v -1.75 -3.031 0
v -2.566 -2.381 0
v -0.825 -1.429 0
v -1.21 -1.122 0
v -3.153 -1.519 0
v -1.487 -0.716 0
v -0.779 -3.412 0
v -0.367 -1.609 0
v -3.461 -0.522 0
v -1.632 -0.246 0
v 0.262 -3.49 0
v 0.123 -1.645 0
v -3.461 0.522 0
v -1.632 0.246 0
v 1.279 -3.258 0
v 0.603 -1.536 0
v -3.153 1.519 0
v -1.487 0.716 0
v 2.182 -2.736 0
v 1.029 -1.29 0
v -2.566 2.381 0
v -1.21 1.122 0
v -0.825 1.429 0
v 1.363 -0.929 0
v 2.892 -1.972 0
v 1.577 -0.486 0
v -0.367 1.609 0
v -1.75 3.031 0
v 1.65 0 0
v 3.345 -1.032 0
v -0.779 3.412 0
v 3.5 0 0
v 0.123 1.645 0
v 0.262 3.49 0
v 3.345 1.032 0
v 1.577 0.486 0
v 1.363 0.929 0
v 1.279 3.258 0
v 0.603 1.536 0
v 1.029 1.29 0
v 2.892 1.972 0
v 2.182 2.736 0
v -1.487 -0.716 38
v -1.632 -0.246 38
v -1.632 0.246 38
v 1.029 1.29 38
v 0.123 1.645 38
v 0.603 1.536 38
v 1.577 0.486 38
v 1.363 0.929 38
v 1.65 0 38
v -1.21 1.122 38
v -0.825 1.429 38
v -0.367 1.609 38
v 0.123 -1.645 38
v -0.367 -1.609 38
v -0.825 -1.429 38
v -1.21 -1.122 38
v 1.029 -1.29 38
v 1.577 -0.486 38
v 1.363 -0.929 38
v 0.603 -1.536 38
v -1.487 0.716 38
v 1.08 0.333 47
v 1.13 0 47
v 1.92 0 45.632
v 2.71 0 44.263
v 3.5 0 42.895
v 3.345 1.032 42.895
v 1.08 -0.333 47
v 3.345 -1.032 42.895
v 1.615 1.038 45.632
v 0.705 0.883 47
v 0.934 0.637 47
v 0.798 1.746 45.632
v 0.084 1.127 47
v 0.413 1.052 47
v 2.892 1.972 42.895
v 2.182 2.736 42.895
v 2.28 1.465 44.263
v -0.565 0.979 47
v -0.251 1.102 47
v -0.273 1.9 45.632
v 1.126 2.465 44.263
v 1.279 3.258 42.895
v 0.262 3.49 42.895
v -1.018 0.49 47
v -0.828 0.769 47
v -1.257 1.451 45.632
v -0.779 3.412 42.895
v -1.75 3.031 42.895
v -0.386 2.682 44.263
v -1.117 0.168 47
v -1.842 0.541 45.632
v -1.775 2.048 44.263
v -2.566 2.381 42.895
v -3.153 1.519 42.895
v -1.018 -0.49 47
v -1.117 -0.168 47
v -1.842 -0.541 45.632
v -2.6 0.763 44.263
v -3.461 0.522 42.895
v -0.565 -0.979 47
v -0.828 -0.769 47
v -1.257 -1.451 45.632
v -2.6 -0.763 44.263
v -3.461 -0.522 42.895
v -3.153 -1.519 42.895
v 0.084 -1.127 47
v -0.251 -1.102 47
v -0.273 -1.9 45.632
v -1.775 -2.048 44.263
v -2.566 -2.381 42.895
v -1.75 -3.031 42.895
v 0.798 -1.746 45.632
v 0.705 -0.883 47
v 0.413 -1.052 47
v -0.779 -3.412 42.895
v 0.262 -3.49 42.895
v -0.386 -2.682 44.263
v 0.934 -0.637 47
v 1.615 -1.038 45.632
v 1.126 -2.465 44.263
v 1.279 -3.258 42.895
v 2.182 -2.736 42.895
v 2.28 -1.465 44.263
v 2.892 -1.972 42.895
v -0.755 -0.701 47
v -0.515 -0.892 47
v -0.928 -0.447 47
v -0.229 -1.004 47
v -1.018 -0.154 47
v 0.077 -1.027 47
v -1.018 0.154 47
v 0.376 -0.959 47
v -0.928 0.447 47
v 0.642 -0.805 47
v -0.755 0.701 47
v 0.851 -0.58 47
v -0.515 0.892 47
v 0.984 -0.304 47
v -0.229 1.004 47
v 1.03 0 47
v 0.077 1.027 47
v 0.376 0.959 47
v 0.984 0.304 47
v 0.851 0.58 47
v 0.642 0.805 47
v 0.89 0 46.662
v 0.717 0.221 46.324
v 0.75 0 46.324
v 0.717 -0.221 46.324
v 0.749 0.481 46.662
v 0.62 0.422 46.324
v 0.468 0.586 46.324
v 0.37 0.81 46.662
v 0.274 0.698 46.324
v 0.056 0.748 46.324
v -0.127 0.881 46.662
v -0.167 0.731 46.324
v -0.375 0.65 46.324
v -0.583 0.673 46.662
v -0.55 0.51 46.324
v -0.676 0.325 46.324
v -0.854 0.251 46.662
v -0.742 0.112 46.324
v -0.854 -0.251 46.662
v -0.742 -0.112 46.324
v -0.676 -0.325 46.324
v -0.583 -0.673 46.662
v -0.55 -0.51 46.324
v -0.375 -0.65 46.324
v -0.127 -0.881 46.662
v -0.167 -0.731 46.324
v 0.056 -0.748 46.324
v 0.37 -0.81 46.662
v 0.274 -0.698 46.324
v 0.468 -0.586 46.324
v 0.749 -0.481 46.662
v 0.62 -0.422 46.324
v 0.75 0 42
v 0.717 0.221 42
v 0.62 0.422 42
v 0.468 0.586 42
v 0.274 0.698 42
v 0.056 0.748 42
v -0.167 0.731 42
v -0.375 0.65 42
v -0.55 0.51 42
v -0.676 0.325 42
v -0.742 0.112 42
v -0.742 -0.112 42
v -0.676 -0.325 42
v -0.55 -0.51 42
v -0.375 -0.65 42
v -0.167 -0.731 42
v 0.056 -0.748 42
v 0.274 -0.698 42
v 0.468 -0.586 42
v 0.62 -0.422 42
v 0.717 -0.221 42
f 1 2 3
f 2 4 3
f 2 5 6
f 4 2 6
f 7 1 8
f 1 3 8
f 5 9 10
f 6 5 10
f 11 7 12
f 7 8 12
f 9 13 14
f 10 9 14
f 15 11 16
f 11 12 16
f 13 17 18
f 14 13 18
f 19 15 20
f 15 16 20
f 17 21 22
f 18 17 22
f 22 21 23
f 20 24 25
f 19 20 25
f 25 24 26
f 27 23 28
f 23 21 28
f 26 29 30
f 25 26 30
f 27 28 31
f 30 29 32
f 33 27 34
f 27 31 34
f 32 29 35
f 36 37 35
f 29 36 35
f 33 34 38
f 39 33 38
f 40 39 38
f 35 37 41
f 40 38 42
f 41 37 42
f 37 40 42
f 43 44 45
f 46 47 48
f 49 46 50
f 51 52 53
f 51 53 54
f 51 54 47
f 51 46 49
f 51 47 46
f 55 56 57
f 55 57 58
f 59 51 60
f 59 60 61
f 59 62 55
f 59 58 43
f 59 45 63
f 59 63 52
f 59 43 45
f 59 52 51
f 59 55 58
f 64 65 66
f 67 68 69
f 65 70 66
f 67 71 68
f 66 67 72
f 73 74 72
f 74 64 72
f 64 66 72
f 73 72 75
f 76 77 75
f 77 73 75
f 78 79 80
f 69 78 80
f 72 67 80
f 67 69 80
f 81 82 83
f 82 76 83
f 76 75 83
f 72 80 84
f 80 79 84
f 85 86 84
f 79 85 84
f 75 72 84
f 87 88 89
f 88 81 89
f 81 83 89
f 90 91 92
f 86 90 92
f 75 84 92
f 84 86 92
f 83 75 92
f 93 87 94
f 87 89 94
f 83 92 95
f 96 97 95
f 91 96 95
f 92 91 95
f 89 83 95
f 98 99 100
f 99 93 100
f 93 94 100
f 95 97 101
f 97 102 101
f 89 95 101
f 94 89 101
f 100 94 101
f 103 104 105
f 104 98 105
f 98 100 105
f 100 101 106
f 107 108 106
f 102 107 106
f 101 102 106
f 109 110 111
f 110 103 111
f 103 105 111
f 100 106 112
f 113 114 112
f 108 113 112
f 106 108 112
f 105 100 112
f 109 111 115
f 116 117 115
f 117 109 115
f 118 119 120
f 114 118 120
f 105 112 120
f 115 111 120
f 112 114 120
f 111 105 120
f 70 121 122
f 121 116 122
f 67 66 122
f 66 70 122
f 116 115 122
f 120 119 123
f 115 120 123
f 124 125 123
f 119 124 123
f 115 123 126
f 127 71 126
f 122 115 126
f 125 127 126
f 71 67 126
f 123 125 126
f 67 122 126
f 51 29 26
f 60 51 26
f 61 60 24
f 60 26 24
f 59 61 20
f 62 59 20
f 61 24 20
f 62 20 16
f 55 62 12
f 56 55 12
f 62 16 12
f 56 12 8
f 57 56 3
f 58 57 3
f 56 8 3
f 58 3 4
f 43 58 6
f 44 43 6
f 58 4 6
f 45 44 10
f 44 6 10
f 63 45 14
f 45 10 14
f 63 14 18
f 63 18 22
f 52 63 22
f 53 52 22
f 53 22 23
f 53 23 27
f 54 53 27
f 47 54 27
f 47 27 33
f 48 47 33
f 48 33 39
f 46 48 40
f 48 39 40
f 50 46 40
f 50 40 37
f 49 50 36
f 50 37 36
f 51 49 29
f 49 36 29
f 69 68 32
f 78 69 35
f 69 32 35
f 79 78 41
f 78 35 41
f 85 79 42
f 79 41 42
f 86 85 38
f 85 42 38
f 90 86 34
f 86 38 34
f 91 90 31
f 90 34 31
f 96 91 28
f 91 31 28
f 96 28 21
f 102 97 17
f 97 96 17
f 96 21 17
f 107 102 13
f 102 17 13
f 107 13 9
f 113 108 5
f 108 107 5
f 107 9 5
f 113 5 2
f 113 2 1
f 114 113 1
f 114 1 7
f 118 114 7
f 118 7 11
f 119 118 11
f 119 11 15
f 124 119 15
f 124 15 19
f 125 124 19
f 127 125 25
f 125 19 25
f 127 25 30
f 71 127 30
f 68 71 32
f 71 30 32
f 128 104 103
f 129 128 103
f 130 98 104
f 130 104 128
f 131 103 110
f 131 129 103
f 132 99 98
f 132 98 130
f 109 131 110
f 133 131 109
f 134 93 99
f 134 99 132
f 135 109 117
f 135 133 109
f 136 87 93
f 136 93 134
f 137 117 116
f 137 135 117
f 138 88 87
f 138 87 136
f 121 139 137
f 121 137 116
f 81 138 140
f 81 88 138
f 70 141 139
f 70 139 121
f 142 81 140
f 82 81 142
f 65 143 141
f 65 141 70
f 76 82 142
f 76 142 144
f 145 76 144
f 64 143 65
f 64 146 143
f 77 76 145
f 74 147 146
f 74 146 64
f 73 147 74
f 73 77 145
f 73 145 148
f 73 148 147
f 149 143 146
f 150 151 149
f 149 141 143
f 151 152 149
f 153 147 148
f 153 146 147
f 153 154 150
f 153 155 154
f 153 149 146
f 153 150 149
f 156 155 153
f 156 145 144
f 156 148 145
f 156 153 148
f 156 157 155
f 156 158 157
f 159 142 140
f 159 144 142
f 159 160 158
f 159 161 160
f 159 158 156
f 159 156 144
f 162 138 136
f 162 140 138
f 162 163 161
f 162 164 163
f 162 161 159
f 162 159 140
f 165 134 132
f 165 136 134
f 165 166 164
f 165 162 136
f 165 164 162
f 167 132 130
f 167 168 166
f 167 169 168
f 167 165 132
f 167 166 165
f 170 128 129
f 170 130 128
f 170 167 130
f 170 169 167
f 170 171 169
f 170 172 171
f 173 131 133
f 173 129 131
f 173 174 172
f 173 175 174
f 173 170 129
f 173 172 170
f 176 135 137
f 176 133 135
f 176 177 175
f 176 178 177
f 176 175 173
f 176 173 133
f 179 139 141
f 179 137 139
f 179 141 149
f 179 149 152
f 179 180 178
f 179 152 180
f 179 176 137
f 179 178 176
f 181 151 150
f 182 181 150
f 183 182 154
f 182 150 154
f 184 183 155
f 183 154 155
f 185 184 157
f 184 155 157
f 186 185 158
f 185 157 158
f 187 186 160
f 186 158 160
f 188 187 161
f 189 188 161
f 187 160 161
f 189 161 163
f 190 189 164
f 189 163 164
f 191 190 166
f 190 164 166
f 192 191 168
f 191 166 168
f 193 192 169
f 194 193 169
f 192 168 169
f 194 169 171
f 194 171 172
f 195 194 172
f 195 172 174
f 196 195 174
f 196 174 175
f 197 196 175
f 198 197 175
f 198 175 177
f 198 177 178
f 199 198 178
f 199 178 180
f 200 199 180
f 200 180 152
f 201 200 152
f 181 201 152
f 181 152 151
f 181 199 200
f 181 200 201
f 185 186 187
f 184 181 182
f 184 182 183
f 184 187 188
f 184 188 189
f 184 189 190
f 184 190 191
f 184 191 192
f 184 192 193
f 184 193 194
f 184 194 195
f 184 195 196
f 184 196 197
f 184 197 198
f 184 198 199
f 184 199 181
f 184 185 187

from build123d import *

# Parameters (mm, degrees)
F0_R      = 3.5
F1_DEPTH  = 25
F2_DEPTH  = 47
F3_R      = 1.65
F4_DEPTH  = 38
F5_R      = 1.13
F6_DEPTH  = 100
F6_TAPER  = -30
F8_R      = 1.03
F9_DEPTH  = 2
F9_TAPER  = 22.5
F10_R     = 0.75
F11_DEPTH = 5


# Not quite as in the source:
# - a feature names something its author has since deleted; it is built from what else it names


with BuildPart() as f1:
    # F0 (on Top) → F1 (new body)
    with BuildSketch(Plane.XY):
        Circle(F0_R)
    extrude(amount=F1_DEPTH)


with BuildPart() as f2:
    # F0 (on Top) → F2 (new body)
    with BuildSketch(Plane.XY):
        Circle(F0_R)
    extrude(amount=F2_DEPTH)


with BuildPart() as f4_tool:
    # F3 (on face) → F4 (new body)
    with BuildSketch(Plane(origin=(0, 0, 0), x_dir=(1, 0, 0), z_dir=(0, 0, -1))):
        Circle(F3_R)
    extrude(amount=-F4_DEPTH)


with BuildPart() as f1_1:
    add(f1.part)

    # F4: cut by f4_tool
    add(f4_tool.part, mode=Mode.SUBTRACT)


with BuildPart() as f2_1:
    add(f2.part)

    # F4: cut by f4_tool
    add(f4_tool.part, mode=Mode.SUBTRACT)


with BuildPart() as f6_tool:
    # F5 (on face) → F6 (new body)
    with BuildSketch(Plane.XY.offset(47)):
        Circle(F5_R)
    extrude(amount=-F6_DEPTH, taper=F6_TAPER)


with BuildPart() as f1_2:
    add(f1_1.part)

    # F6: intersect by f6_tool
    add(f6_tool.part, mode=Mode.INTERSECT)


with BuildPart() as f2_2:
    add(f2_1.part)

    # F6: intersect by f6_tool
    add(f6_tool.part, mode=Mode.INTERSECT)

    # F8 (on face) → F9 (cut)
    with BuildSketch(Plane.XY.offset(47)):
        Circle(F8_R)
    extrude(amount=-F9_DEPTH, taper=F9_TAPER, mode=Mode.SUBTRACT)

    # F10 (on face) → F11 (cut)
    with BuildSketch(Plane.XY.offset(47)):
        Circle(F10_R)
    extrude(amount=-F11_DEPTH, mode=Mode.SUBTRACT)


solid = f2_2.part
